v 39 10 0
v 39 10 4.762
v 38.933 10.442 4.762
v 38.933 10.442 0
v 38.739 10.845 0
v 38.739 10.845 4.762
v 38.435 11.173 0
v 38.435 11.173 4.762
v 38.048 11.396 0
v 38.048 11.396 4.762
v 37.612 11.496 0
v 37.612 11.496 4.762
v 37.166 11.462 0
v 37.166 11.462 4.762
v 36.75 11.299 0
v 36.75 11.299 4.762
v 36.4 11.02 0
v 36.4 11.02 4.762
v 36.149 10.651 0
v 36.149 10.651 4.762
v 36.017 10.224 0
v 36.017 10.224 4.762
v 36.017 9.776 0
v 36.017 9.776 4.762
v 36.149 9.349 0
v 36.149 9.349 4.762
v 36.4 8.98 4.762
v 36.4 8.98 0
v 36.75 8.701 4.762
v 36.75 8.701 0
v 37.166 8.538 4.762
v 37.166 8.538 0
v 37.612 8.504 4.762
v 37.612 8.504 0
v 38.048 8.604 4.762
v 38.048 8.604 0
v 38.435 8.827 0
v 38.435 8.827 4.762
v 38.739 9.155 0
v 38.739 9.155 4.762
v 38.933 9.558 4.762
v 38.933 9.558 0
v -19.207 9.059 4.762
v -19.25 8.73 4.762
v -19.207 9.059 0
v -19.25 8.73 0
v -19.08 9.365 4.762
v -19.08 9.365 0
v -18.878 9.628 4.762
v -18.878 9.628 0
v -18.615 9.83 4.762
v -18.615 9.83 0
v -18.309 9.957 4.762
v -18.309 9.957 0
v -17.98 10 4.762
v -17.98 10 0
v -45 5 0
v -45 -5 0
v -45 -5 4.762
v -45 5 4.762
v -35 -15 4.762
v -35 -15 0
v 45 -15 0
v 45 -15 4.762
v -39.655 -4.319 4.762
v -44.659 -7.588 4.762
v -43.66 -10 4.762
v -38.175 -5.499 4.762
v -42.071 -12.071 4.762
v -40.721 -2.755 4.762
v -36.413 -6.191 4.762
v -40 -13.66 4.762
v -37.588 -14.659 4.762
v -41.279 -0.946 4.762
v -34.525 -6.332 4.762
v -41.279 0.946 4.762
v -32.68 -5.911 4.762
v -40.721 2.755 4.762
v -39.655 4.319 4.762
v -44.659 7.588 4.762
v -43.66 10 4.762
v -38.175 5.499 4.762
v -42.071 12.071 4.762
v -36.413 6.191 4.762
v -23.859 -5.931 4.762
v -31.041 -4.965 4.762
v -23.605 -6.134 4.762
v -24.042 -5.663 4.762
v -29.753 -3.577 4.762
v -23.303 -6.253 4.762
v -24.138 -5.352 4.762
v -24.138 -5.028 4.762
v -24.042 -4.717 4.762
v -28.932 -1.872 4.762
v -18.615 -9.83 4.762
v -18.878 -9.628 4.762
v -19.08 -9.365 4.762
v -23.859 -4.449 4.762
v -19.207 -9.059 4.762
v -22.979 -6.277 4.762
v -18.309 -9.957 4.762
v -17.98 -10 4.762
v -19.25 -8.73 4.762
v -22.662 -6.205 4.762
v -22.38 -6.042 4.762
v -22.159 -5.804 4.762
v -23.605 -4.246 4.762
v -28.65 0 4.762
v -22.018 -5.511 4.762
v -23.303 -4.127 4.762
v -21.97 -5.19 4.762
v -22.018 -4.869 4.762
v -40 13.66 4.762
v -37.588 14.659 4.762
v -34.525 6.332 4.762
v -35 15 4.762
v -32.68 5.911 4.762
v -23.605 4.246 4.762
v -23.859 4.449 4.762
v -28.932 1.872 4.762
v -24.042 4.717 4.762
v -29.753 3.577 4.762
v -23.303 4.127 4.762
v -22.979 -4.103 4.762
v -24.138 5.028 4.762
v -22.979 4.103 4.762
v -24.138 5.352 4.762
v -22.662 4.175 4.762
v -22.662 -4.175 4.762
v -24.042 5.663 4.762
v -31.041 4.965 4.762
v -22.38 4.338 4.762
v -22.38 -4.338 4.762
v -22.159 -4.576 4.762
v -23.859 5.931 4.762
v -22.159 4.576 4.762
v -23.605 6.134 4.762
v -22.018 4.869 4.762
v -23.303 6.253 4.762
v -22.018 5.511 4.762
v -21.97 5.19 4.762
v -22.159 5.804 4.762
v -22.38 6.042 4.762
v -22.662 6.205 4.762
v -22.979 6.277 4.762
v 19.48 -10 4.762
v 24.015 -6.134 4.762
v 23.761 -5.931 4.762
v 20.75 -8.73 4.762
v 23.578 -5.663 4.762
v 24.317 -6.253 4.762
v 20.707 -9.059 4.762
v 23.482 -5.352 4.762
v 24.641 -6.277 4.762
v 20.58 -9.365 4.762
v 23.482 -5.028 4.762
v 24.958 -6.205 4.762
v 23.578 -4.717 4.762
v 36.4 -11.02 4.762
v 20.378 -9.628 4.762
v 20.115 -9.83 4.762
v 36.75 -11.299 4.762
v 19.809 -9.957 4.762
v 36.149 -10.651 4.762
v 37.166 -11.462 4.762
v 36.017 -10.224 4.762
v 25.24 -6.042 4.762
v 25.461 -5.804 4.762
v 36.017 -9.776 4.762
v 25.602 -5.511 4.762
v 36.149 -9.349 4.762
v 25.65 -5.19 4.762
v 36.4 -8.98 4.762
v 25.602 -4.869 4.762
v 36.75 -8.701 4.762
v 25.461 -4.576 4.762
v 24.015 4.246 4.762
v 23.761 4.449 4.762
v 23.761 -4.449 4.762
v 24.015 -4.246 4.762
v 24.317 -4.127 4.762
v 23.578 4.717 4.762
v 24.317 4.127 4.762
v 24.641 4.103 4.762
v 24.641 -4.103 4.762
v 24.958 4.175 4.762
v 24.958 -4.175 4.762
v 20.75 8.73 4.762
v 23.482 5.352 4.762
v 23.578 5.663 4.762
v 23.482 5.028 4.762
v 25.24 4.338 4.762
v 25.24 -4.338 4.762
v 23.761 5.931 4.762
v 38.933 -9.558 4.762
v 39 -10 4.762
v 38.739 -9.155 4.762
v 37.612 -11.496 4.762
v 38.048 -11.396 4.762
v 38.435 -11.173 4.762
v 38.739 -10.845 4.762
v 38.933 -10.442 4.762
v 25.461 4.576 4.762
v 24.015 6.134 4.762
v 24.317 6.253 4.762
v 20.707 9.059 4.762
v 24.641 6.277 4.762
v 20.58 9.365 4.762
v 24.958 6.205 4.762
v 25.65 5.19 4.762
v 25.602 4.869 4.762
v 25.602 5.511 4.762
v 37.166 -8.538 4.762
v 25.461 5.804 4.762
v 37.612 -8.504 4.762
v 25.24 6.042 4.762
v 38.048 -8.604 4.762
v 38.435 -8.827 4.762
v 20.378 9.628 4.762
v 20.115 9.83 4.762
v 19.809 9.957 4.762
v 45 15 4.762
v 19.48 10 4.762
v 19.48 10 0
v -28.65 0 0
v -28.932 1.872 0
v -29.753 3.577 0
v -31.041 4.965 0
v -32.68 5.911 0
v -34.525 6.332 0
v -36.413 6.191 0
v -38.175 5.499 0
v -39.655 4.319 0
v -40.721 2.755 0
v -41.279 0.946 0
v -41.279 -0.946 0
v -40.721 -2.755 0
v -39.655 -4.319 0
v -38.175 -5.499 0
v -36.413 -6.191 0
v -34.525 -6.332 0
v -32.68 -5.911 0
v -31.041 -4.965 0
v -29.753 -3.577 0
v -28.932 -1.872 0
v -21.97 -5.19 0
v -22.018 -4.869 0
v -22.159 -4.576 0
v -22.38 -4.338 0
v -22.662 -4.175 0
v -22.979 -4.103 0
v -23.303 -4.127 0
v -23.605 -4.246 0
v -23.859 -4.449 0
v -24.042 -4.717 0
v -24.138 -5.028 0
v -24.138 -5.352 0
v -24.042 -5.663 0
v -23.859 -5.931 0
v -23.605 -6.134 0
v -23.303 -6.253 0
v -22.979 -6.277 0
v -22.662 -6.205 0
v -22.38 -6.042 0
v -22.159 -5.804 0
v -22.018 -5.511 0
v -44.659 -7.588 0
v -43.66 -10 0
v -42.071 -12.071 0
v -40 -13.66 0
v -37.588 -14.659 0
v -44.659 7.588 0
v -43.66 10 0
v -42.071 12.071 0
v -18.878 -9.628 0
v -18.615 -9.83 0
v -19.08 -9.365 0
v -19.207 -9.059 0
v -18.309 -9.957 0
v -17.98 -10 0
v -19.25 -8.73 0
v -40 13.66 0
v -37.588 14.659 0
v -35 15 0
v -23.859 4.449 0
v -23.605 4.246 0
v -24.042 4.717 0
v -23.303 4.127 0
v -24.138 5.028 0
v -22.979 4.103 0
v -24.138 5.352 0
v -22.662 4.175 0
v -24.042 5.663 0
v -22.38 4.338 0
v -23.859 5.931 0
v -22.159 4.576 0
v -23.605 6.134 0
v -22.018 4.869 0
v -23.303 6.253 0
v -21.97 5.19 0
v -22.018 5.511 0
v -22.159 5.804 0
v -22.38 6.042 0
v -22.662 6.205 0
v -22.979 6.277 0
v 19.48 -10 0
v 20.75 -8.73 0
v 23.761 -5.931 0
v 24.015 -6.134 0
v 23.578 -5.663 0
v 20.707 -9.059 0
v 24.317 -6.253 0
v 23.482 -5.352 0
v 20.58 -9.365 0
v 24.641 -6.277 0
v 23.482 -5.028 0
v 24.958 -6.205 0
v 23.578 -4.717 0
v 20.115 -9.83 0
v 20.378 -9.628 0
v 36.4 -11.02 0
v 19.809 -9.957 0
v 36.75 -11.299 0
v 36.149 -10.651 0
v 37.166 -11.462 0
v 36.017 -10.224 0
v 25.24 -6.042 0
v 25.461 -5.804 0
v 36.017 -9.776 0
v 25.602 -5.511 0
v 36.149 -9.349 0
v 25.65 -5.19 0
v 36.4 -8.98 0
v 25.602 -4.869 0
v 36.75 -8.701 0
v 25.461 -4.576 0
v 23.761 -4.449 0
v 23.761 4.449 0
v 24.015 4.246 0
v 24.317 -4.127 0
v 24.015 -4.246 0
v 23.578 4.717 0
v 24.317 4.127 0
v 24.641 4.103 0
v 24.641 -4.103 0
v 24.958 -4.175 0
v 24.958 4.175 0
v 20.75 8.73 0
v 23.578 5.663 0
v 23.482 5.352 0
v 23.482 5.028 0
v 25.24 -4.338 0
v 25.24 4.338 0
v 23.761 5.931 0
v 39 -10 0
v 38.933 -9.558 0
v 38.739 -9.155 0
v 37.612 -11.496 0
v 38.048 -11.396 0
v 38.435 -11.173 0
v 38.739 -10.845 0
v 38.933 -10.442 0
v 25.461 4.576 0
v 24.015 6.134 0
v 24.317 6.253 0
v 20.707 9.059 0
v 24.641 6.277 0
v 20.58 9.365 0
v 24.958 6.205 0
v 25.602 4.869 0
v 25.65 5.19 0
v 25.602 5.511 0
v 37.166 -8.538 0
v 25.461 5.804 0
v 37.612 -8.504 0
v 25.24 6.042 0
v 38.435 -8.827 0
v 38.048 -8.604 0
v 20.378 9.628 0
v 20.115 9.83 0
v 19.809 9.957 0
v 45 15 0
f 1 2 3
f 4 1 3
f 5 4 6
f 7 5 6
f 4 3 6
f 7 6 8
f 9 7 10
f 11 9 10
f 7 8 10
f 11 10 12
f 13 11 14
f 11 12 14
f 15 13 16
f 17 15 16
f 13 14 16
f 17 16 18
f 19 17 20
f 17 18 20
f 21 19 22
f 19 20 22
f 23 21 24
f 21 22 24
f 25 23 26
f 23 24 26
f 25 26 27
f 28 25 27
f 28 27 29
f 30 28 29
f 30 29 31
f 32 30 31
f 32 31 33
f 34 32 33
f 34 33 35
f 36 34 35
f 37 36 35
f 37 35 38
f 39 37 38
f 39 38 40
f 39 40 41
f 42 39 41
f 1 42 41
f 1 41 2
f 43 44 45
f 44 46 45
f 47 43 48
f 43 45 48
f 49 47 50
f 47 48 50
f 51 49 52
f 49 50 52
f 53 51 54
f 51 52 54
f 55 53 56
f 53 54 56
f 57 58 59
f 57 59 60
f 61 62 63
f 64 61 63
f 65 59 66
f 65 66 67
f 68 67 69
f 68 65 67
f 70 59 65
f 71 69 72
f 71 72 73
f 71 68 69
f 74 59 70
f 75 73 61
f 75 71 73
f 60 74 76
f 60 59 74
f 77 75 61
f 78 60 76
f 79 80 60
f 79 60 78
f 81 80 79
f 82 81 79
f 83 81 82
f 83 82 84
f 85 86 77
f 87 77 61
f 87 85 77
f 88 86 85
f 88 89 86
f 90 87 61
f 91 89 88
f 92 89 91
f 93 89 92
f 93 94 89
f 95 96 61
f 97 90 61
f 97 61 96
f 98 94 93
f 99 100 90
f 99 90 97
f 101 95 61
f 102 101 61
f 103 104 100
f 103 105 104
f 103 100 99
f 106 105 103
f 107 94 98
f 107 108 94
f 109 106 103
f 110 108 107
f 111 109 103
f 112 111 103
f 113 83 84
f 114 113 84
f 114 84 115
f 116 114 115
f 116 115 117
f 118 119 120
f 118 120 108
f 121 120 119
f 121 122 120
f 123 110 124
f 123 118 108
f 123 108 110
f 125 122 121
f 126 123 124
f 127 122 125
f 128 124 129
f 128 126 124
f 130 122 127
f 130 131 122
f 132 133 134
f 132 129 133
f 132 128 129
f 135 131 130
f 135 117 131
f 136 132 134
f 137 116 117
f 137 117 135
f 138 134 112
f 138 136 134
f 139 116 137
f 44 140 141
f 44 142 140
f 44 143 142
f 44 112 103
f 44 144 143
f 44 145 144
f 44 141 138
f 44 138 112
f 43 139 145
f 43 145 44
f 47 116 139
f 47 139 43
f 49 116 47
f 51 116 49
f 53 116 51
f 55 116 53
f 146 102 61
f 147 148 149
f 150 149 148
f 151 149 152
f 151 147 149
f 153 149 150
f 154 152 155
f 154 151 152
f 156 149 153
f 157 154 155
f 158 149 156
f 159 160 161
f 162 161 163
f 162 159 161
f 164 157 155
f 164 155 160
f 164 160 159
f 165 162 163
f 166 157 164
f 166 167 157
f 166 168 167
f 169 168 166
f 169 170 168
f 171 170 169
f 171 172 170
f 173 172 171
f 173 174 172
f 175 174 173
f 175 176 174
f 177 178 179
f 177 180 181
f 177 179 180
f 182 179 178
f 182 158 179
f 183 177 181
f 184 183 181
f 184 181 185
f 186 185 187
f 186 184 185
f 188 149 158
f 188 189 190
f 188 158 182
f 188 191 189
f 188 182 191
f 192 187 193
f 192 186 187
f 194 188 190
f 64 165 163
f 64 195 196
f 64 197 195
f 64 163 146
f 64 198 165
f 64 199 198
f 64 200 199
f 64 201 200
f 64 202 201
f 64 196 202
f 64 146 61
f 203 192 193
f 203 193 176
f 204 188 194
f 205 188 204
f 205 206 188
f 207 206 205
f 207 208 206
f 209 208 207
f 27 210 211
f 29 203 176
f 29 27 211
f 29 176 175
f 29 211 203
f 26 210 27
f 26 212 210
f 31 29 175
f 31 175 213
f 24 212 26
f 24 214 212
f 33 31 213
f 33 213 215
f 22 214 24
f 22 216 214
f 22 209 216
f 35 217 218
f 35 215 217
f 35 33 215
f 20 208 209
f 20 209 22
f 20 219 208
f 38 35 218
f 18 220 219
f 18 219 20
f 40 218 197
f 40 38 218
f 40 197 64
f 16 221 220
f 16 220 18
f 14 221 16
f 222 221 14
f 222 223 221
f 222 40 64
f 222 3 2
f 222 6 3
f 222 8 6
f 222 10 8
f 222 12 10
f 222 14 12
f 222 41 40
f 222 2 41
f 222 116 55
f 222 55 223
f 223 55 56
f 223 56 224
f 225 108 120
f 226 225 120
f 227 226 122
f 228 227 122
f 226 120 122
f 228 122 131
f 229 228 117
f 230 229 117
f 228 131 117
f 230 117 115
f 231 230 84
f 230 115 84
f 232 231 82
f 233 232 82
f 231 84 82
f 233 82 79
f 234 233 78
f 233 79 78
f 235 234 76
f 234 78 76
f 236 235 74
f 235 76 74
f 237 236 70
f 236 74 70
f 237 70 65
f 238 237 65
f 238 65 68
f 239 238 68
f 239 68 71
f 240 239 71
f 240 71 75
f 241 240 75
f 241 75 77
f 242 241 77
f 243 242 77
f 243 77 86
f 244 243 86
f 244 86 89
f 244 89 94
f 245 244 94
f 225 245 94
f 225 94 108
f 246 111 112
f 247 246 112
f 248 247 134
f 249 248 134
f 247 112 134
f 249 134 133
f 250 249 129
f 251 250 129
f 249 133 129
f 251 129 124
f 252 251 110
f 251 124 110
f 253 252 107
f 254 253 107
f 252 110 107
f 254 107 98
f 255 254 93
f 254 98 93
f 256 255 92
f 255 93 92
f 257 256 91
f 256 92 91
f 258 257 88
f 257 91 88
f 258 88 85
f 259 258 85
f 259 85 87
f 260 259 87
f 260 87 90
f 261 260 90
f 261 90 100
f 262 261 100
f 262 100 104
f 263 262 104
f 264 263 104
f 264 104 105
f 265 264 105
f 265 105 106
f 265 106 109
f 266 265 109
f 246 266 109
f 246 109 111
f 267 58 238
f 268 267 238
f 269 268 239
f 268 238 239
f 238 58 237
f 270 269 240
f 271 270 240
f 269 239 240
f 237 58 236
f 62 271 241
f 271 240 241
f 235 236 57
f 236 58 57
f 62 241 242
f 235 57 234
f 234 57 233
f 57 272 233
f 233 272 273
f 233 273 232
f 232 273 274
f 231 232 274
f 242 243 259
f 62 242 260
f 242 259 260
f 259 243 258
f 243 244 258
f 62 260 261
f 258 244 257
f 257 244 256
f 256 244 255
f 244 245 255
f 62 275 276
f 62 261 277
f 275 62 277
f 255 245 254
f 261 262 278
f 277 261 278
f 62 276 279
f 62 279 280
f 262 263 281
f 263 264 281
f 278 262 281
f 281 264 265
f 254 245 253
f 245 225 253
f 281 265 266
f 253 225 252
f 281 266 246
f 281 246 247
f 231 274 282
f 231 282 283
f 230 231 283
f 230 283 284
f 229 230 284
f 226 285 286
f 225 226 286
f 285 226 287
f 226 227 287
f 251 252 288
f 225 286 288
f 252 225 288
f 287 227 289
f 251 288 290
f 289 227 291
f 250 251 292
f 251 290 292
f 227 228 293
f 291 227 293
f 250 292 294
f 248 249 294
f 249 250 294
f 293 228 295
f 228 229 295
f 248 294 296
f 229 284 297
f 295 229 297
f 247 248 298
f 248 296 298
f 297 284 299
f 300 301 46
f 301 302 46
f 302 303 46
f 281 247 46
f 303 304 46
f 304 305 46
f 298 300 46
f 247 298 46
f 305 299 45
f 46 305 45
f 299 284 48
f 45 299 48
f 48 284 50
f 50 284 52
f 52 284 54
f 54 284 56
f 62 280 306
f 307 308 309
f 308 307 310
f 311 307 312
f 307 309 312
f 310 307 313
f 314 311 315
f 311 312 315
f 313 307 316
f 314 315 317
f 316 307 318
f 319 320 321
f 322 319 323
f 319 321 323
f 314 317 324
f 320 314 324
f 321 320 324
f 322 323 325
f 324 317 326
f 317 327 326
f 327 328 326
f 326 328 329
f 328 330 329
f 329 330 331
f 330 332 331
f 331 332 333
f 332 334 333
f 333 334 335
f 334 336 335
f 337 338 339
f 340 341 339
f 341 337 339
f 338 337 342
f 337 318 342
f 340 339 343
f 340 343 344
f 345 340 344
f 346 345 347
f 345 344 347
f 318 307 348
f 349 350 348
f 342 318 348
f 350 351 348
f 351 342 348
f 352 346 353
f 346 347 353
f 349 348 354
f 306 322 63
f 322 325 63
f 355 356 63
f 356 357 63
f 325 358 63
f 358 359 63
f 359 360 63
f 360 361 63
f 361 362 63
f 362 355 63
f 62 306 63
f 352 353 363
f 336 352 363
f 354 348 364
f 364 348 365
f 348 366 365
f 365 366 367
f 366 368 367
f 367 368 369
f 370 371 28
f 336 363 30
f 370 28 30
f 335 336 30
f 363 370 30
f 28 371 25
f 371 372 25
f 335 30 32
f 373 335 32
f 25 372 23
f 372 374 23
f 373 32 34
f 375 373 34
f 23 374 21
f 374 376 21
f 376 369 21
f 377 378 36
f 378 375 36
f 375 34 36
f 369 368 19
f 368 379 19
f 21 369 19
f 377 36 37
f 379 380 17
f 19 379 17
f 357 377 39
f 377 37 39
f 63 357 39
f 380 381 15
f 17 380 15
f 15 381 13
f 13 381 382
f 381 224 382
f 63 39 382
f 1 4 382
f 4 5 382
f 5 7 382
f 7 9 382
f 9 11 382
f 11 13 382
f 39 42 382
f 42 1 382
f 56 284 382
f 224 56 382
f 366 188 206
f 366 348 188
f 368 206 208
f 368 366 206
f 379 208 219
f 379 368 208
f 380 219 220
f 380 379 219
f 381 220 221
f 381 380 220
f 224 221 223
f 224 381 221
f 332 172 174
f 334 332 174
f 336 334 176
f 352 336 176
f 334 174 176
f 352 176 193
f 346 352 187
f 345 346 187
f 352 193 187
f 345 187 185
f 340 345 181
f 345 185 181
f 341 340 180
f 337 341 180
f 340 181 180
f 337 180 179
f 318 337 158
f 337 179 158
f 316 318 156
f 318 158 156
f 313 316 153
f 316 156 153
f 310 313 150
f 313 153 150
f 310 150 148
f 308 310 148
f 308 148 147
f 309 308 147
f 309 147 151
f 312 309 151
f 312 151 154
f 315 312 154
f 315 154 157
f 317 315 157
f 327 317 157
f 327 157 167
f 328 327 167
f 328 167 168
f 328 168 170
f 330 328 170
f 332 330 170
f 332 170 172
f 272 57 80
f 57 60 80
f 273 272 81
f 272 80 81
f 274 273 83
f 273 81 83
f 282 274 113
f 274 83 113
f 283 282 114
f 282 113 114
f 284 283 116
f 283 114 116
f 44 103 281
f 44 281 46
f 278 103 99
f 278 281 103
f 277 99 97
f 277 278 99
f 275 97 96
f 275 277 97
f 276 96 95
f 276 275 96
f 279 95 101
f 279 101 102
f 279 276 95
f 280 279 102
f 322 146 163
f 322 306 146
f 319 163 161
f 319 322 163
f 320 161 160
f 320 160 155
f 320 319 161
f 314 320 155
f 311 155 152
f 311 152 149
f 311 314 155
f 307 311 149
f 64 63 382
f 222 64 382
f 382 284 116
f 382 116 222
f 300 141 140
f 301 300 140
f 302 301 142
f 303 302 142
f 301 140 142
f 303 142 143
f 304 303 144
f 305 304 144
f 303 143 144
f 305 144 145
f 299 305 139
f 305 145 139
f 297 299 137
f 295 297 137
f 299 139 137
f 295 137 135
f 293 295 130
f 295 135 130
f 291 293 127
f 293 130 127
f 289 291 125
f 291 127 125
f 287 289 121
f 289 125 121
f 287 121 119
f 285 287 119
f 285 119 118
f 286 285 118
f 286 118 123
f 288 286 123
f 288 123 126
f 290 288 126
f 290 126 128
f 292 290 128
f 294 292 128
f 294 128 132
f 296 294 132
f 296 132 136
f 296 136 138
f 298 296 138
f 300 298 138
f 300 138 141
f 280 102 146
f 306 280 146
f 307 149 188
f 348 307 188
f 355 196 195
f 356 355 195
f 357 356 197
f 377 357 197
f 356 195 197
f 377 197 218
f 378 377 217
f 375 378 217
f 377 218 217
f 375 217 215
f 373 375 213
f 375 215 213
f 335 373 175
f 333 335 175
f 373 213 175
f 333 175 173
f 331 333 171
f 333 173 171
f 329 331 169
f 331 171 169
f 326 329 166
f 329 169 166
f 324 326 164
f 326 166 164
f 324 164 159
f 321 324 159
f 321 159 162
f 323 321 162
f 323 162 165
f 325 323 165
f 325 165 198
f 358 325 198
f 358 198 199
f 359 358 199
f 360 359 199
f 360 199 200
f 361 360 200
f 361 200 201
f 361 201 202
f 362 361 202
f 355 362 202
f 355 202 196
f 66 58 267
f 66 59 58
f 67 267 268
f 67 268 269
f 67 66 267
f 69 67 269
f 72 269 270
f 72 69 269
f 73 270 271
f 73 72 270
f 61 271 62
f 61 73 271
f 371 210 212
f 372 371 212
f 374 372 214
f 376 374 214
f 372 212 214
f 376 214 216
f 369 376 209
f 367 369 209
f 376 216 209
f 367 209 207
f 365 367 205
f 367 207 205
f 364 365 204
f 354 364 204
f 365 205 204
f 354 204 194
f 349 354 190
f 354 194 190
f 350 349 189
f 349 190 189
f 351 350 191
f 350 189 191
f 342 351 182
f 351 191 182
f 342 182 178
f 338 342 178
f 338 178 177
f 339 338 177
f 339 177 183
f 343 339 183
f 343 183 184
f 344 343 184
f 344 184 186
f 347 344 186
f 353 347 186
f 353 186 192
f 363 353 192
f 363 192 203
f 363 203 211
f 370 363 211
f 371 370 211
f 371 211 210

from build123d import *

# Parameters (mm, degrees)
ESQUISSE1_W             = 90
ESQUISSE1_H             = 30
BOSS_EXTRU_1_DEPTH      = 4.7625
CONG_1_R                = 10
ESQUISSE2_R             = 6.35
ENL_V_MAT_EXTRU_1_DEPTH = 6
ENL_V_MAT_EXTRU_2_REACH = 49.673
ESQUISSE3_W             = 40
ESQUISSE3_H             = 20
CONG_2_R                = 1.27
ENL_V_MAT_EXTRU_3_REACH = 49.673
ESQUISSE4_R             = 1.09
ENL_V_MAT_EXTRU_4_REACH = 49.673
ESQUISSE6_R             = 1.5


with BuildPart() as part:
    # Esquisse1 → Boss.-Extru.1 (new body)
    with BuildSketch(Plane.XY):
        Rectangle(ESQUISSE1_W, ESQUISSE1_H)
    extrude(amount=BOSS_EXTRU_1_DEPTH)

    # Congé1
    cong_1_edges = [part.edges().sort_by_distance(p)[0] for p in [
        (-45, -15, 2.38125),
        (-45, 15, 2.38125),
    ]]
    fillet(cong_1_edges, radius=CONG_1_R)

    # Esquisse2 → Enlèv. mat.-Extru.1 (cut)
    with BuildSketch(Plane.XY.offset(4.7625)):
        with Locations((-35, 0)):
            Circle(ESQUISSE2_R)
    extrude(amount=-ENL_V_MAT_EXTRU_1_DEPTH, mode=Mode.SUBTRACT)

    # Esquisse3 → Enlèv. mat.-Extru.2 (cut, up to next)
    with BuildSketch(Plane.XY.offset(4.7625), mode=Mode.PRIVATE) as enl_v_mat_extru_2_sk1:
        with Locations((0.75, 0)):
            Rectangle(ESQUISSE3_W, ESQUISSE3_H)
    enl_v_mat_extru_2_tool1 = extrude(enl_v_mat_extru_2_sk1.sketch, amount=-ENL_V_MAT_EXTRU_2_REACH, mode=Mode.PRIVATE) & part.part
    add(enl_v_mat_extru_2_tool1.solids().sort_by_distance((0.75, 0, 4.7625))[0], mode=Mode.SUBTRACT)

    # Congé2
    cong_2_edges = [part.edges().sort_by_distance(p)[0] for p in [
        (-19.25, -10, 2.38125),
        (-19.25, 10, 2.38125),
        (20.75, 10, 2.38125),
        (20.75, -10, 2.38125),
    ]]
    fillet(cong_2_edges, radius=CONG_2_R)

    # Esquisse4 → Enlèv. mat.-Extru.3 (cut, up to next)
    with BuildSketch(Plane.XY.offset(4.7625), mode=Mode.PRIVATE) as enl_v_mat_extru_3_sk1:
        with Locations((-23.06, 5.19)):
            Circle(ESQUISSE4_R)
    enl_v_mat_extru_3_tool1 = extrude(enl_v_mat_extru_3_sk1.sketch, amount=-ENL_V_MAT_EXTRU_3_REACH, mode=Mode.PRIVATE) & part.part
    # Esquisse4 → Enlèv. mat.-Extru.3 (cut, up to next)
    with BuildSketch(Plane.XY.offset(4.7625), mode=Mode.PRIVATE) as enl_v_mat_extru_3_sk2:
        with Locations((-23.06, -5.19)):
            Circle(ESQUISSE4_R)
    enl_v_mat_extru_3_tool2 = extrude(enl_v_mat_extru_3_sk2.sketch, amount=-ENL_V_MAT_EXTRU_3_REACH, mode=Mode.PRIVATE) & part.part
    # Esquisse4 → Enlèv. mat.-Extru.3 (cut, up to next)
    with BuildSketch(Plane.XY.offset(4.7625), mode=Mode.PRIVATE) as enl_v_mat_extru_3_sk3:
        with Locations((24.56, -5.19)):
            Circle(ESQUISSE4_R)
    enl_v_mat_extru_3_tool3 = extrude(enl_v_mat_extru_3_sk3.sketch, amount=-ENL_V_MAT_EXTRU_3_REACH, mode=Mode.PRIVATE) & part.part
    # Esquisse4 → Enlèv. mat.-Extru.3 (cut, up to next)
    with BuildSketch(Plane.XY.offset(4.7625), mode=Mode.PRIVATE) as enl_v_mat_extru_3_sk4:
        with Locations((24.56, 5.19)):
            Circle(ESQUISSE4_R)
    enl_v_mat_extru_3_tool4 = extrude(enl_v_mat_extru_3_sk4.sketch, amount=-ENL_V_MAT_EXTRU_3_REACH, mode=Mode.PRIVATE) & part.part
    add(enl_v_mat_extru_3_tool1.solids().sort_by_distance((-23.06, 5.19, 4.7625))[0], mode=Mode.SUBTRACT)
    add(enl_v_mat_extru_3_tool2.solids().sort_by_distance((-23.06, -5.19, 4.7625))[0], mode=Mode.SUBTRACT)
    add(enl_v_mat_extru_3_tool3.solids().sort_by_distance((24.56, -5.19, 4.7625))[0], mode=Mode.SUBTRACT)
    add(enl_v_mat_extru_3_tool4.solids().sort_by_distance((24.56, 5.19, 4.7625))[0], mode=Mode.SUBTRACT)

    # Esquisse6 → Enlèv. mat.-Extru.4 (cut, up to next)
    with BuildSketch(Plane.XY.offset(4.7625), mode=Mode.PRIVATE) as enl_v_mat_extru_4_sk1:
        with Locations((37.5, 10)):
            Circle(ESQUISSE6_R)
    enl_v_mat_extru_4_tool1 = extrude(enl_v_mat_extru_4_sk1.sketch, amount=-ENL_V_MAT_EXTRU_4_REACH, mode=Mode.PRIVATE) & part.part
    # Esquisse6 → Enlèv. mat.-Extru.4 (cut, up to next)
    with BuildSketch(Plane.XY.offset(4.7625), mode=Mode.PRIVATE) as enl_v_mat_extru_4_sk2:
        with Locations((37.5, -10)):
            Circle(ESQUISSE6_R)
    enl_v_mat_extru_4_tool2 = extrude(enl_v_mat_extru_4_sk2.sketch, amount=-ENL_V_MAT_EXTRU_4_REACH, mode=Mode.PRIVATE) & part.part
    add(enl_v_mat_extru_4_tool1.solids().sort_by_distance((37.5, 10, 4.7625))[0], mode=Mode.SUBTRACT)
    add(enl_v_mat_extru_4_tool2.solids().sort_by_distance((37.5, -10, 4.7625))[0], mode=Mode.SUBTRACT)


solid = part.part
